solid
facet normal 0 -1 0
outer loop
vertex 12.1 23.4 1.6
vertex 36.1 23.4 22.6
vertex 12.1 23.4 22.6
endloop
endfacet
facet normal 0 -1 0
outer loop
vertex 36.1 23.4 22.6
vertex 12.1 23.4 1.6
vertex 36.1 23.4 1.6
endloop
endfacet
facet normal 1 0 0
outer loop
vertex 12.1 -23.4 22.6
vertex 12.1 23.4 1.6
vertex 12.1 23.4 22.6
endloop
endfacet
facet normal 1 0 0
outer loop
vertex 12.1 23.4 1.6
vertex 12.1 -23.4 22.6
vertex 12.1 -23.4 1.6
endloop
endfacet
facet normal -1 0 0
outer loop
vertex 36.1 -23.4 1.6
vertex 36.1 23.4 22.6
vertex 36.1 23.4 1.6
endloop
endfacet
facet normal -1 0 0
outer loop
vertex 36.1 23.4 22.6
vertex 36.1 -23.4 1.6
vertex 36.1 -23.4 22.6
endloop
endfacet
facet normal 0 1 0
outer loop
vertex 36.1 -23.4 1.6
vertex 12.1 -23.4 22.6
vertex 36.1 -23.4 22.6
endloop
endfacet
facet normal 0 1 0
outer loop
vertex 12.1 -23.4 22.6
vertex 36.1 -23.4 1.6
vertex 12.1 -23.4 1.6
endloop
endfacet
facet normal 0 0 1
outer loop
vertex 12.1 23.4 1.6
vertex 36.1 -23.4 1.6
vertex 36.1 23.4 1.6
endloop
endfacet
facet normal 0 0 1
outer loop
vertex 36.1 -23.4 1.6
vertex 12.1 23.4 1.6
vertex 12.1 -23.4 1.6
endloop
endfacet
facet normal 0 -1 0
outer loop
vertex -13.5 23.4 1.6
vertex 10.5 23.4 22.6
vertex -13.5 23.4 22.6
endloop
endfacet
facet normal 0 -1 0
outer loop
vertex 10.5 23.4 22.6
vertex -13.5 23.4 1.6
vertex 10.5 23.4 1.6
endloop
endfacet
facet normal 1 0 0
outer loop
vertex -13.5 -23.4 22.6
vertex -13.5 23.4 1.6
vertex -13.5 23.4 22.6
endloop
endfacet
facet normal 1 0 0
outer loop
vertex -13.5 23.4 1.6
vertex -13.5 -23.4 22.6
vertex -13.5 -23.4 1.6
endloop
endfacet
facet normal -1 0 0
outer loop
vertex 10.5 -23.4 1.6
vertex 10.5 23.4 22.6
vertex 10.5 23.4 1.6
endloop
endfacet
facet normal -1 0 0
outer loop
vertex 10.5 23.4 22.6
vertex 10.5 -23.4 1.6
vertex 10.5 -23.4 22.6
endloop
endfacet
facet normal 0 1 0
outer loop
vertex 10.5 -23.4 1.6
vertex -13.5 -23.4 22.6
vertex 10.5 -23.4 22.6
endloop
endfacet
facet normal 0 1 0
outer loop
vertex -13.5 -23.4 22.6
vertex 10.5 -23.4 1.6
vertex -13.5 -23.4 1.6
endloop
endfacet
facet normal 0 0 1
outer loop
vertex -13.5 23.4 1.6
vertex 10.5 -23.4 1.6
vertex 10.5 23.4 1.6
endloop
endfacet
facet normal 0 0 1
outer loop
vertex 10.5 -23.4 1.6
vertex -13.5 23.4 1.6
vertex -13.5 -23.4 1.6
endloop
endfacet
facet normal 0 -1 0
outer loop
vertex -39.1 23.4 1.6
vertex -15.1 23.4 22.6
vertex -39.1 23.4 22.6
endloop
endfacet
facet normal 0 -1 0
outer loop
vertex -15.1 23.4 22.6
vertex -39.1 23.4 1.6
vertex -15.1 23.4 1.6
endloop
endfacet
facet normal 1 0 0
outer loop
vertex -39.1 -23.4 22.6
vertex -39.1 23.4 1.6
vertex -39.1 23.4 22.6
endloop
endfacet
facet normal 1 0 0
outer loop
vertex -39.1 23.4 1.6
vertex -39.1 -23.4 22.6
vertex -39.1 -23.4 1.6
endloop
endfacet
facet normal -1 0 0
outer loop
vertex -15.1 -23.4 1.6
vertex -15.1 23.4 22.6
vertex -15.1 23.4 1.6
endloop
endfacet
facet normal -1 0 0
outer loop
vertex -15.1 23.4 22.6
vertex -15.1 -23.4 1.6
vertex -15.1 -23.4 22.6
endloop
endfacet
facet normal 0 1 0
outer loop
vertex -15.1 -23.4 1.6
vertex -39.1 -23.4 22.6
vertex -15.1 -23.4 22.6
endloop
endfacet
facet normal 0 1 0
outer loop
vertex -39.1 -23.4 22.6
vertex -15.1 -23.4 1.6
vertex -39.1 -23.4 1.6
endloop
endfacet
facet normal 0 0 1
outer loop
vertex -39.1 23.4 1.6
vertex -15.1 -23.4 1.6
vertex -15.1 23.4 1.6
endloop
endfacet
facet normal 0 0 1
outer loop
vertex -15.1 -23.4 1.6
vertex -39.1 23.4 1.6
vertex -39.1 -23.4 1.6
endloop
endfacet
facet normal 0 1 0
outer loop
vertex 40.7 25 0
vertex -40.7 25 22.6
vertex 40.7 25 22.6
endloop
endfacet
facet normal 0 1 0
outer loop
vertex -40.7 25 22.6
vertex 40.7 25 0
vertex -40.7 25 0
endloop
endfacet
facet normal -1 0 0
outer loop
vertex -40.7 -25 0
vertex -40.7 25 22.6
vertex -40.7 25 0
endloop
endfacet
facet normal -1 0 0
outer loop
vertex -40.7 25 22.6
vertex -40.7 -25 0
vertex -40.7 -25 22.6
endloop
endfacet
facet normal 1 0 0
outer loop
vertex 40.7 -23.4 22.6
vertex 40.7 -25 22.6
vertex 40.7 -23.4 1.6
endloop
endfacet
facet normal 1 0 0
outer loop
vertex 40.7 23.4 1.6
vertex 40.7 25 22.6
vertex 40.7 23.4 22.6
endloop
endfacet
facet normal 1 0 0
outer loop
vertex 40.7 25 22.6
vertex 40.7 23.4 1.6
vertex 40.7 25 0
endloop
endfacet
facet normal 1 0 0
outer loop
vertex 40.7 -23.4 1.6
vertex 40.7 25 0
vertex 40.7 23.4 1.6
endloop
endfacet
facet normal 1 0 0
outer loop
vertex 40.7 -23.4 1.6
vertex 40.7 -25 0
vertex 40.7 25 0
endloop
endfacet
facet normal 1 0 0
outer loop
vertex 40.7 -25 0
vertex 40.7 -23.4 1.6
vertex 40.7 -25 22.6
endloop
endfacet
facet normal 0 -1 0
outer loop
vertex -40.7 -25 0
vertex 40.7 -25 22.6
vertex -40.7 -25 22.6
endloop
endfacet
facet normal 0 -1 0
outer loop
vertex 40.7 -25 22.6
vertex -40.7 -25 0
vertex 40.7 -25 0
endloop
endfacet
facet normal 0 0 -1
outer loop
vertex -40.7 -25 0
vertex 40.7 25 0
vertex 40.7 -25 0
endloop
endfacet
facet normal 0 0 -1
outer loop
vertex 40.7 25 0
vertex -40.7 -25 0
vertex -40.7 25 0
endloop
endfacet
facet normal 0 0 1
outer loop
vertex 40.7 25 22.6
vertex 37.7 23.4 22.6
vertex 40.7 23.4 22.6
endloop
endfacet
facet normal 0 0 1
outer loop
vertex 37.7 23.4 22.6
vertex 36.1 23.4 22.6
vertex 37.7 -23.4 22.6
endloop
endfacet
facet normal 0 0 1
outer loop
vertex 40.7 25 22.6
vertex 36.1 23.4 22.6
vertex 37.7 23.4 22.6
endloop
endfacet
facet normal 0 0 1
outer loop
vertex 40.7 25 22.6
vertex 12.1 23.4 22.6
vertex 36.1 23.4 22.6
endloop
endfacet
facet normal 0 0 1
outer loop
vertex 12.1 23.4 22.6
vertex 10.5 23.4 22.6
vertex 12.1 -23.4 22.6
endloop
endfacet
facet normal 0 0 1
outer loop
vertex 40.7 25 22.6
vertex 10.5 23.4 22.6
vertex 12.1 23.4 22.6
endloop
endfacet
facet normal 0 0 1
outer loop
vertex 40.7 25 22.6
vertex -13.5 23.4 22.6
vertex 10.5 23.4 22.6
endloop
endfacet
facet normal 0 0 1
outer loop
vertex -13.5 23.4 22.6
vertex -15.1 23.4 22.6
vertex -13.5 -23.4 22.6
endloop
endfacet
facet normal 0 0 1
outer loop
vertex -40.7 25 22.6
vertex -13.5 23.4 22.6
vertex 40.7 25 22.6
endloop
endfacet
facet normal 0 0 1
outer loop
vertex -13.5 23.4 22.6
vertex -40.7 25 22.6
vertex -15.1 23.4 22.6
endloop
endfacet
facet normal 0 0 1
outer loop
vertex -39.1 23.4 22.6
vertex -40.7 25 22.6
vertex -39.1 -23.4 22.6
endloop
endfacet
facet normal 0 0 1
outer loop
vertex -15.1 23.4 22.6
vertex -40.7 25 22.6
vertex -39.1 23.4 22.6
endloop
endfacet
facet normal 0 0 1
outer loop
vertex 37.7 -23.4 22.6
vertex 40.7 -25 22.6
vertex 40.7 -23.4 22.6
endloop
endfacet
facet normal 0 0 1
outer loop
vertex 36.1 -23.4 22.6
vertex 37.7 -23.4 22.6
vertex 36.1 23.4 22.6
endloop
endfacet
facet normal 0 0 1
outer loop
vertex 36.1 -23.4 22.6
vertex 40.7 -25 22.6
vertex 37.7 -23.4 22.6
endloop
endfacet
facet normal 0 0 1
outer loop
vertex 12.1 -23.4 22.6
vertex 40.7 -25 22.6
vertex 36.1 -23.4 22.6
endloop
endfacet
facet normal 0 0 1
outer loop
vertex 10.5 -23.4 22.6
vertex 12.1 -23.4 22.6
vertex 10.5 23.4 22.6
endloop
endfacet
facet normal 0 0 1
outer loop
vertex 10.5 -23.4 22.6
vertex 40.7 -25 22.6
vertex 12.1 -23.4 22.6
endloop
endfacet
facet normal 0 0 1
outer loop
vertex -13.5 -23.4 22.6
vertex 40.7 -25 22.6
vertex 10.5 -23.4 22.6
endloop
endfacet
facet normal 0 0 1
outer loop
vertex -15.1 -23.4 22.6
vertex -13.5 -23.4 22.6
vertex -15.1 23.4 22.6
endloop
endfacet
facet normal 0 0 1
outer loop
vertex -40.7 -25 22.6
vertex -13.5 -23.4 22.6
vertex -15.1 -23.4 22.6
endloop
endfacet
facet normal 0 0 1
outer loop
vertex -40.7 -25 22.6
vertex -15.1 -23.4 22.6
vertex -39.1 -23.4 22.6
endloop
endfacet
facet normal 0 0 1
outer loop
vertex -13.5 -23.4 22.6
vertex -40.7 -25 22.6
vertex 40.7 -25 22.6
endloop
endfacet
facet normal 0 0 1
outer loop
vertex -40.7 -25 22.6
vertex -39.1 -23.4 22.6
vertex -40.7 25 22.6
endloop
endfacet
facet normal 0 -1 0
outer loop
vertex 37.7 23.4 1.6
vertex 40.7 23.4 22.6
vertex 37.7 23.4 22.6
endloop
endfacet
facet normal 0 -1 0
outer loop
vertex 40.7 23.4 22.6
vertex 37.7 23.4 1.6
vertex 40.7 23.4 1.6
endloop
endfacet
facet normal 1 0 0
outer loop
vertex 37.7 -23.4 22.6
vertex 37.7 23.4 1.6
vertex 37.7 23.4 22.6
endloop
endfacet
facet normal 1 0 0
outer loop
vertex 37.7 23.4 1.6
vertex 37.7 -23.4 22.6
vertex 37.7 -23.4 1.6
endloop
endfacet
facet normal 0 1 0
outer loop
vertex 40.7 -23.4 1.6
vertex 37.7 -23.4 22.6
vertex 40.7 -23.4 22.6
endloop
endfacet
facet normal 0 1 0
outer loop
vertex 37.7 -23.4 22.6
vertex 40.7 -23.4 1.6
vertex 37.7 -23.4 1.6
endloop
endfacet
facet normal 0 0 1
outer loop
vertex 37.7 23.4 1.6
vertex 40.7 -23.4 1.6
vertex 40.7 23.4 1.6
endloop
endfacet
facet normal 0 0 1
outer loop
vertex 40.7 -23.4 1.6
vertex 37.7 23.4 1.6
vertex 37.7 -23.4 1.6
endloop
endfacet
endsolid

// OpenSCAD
/* Tiny Bookcase
   by Lyl3

Creates a tiny bookcase for the tiny secret books that are scaled to 50%

This code is published at:
https://www.thingiverse.com/thing:3860734
licensed under the Creative Commons - Attribution - Share Alike license (CC BY-SA 3.0)
*/

/* [Basic parameters] */

// The number of shelves in the bookcase
numShelves = 3; // [1:1:10]

// The width of the bookcase (mm)
caseWidth = 50; // [15:1:200]

/* [Advanced parameters] */

// The height of each shelf (mm)
shelfHeight = 24; 

// The depth of each shelf (mm)
shelfDepth = 21;

// The height of the base (below the bottom shelf) of the bookcase (mm)
baseHeight = 3; // [0:1:10]

// The width of the walls (mm)
wallWidth = 1.6; // [0.8:0.1:10]

fudge = 0.005 + 0.0;

caseHeight = numShelves*(shelfHeight+wallWidth) + baseHeight + wallWidth;
caseDepth = shelfDepth + wallWidth;

translate([caseHeight/2,-caseWidth/2,caseDepth]) rotate([-90,0,90])
difference() {
  cube([caseWidth,caseDepth,caseHeight]);
  translate([wallWidth,-fudge,-fudge]) cube([caseWidth-2*wallWidth,caseDepth-wallWidth+fudge,baseHeight+fudge]);
  for (i = [1:numShelves]) {   
    translate([wallWidth,-fudge,(i-1)*(shelfHeight+wallWidth)+baseHeight+wallWidth]) cube([caseWidth-2*wallWidth, caseDepth-wallWidth+fudge, shelfHeight]);
  }
}
